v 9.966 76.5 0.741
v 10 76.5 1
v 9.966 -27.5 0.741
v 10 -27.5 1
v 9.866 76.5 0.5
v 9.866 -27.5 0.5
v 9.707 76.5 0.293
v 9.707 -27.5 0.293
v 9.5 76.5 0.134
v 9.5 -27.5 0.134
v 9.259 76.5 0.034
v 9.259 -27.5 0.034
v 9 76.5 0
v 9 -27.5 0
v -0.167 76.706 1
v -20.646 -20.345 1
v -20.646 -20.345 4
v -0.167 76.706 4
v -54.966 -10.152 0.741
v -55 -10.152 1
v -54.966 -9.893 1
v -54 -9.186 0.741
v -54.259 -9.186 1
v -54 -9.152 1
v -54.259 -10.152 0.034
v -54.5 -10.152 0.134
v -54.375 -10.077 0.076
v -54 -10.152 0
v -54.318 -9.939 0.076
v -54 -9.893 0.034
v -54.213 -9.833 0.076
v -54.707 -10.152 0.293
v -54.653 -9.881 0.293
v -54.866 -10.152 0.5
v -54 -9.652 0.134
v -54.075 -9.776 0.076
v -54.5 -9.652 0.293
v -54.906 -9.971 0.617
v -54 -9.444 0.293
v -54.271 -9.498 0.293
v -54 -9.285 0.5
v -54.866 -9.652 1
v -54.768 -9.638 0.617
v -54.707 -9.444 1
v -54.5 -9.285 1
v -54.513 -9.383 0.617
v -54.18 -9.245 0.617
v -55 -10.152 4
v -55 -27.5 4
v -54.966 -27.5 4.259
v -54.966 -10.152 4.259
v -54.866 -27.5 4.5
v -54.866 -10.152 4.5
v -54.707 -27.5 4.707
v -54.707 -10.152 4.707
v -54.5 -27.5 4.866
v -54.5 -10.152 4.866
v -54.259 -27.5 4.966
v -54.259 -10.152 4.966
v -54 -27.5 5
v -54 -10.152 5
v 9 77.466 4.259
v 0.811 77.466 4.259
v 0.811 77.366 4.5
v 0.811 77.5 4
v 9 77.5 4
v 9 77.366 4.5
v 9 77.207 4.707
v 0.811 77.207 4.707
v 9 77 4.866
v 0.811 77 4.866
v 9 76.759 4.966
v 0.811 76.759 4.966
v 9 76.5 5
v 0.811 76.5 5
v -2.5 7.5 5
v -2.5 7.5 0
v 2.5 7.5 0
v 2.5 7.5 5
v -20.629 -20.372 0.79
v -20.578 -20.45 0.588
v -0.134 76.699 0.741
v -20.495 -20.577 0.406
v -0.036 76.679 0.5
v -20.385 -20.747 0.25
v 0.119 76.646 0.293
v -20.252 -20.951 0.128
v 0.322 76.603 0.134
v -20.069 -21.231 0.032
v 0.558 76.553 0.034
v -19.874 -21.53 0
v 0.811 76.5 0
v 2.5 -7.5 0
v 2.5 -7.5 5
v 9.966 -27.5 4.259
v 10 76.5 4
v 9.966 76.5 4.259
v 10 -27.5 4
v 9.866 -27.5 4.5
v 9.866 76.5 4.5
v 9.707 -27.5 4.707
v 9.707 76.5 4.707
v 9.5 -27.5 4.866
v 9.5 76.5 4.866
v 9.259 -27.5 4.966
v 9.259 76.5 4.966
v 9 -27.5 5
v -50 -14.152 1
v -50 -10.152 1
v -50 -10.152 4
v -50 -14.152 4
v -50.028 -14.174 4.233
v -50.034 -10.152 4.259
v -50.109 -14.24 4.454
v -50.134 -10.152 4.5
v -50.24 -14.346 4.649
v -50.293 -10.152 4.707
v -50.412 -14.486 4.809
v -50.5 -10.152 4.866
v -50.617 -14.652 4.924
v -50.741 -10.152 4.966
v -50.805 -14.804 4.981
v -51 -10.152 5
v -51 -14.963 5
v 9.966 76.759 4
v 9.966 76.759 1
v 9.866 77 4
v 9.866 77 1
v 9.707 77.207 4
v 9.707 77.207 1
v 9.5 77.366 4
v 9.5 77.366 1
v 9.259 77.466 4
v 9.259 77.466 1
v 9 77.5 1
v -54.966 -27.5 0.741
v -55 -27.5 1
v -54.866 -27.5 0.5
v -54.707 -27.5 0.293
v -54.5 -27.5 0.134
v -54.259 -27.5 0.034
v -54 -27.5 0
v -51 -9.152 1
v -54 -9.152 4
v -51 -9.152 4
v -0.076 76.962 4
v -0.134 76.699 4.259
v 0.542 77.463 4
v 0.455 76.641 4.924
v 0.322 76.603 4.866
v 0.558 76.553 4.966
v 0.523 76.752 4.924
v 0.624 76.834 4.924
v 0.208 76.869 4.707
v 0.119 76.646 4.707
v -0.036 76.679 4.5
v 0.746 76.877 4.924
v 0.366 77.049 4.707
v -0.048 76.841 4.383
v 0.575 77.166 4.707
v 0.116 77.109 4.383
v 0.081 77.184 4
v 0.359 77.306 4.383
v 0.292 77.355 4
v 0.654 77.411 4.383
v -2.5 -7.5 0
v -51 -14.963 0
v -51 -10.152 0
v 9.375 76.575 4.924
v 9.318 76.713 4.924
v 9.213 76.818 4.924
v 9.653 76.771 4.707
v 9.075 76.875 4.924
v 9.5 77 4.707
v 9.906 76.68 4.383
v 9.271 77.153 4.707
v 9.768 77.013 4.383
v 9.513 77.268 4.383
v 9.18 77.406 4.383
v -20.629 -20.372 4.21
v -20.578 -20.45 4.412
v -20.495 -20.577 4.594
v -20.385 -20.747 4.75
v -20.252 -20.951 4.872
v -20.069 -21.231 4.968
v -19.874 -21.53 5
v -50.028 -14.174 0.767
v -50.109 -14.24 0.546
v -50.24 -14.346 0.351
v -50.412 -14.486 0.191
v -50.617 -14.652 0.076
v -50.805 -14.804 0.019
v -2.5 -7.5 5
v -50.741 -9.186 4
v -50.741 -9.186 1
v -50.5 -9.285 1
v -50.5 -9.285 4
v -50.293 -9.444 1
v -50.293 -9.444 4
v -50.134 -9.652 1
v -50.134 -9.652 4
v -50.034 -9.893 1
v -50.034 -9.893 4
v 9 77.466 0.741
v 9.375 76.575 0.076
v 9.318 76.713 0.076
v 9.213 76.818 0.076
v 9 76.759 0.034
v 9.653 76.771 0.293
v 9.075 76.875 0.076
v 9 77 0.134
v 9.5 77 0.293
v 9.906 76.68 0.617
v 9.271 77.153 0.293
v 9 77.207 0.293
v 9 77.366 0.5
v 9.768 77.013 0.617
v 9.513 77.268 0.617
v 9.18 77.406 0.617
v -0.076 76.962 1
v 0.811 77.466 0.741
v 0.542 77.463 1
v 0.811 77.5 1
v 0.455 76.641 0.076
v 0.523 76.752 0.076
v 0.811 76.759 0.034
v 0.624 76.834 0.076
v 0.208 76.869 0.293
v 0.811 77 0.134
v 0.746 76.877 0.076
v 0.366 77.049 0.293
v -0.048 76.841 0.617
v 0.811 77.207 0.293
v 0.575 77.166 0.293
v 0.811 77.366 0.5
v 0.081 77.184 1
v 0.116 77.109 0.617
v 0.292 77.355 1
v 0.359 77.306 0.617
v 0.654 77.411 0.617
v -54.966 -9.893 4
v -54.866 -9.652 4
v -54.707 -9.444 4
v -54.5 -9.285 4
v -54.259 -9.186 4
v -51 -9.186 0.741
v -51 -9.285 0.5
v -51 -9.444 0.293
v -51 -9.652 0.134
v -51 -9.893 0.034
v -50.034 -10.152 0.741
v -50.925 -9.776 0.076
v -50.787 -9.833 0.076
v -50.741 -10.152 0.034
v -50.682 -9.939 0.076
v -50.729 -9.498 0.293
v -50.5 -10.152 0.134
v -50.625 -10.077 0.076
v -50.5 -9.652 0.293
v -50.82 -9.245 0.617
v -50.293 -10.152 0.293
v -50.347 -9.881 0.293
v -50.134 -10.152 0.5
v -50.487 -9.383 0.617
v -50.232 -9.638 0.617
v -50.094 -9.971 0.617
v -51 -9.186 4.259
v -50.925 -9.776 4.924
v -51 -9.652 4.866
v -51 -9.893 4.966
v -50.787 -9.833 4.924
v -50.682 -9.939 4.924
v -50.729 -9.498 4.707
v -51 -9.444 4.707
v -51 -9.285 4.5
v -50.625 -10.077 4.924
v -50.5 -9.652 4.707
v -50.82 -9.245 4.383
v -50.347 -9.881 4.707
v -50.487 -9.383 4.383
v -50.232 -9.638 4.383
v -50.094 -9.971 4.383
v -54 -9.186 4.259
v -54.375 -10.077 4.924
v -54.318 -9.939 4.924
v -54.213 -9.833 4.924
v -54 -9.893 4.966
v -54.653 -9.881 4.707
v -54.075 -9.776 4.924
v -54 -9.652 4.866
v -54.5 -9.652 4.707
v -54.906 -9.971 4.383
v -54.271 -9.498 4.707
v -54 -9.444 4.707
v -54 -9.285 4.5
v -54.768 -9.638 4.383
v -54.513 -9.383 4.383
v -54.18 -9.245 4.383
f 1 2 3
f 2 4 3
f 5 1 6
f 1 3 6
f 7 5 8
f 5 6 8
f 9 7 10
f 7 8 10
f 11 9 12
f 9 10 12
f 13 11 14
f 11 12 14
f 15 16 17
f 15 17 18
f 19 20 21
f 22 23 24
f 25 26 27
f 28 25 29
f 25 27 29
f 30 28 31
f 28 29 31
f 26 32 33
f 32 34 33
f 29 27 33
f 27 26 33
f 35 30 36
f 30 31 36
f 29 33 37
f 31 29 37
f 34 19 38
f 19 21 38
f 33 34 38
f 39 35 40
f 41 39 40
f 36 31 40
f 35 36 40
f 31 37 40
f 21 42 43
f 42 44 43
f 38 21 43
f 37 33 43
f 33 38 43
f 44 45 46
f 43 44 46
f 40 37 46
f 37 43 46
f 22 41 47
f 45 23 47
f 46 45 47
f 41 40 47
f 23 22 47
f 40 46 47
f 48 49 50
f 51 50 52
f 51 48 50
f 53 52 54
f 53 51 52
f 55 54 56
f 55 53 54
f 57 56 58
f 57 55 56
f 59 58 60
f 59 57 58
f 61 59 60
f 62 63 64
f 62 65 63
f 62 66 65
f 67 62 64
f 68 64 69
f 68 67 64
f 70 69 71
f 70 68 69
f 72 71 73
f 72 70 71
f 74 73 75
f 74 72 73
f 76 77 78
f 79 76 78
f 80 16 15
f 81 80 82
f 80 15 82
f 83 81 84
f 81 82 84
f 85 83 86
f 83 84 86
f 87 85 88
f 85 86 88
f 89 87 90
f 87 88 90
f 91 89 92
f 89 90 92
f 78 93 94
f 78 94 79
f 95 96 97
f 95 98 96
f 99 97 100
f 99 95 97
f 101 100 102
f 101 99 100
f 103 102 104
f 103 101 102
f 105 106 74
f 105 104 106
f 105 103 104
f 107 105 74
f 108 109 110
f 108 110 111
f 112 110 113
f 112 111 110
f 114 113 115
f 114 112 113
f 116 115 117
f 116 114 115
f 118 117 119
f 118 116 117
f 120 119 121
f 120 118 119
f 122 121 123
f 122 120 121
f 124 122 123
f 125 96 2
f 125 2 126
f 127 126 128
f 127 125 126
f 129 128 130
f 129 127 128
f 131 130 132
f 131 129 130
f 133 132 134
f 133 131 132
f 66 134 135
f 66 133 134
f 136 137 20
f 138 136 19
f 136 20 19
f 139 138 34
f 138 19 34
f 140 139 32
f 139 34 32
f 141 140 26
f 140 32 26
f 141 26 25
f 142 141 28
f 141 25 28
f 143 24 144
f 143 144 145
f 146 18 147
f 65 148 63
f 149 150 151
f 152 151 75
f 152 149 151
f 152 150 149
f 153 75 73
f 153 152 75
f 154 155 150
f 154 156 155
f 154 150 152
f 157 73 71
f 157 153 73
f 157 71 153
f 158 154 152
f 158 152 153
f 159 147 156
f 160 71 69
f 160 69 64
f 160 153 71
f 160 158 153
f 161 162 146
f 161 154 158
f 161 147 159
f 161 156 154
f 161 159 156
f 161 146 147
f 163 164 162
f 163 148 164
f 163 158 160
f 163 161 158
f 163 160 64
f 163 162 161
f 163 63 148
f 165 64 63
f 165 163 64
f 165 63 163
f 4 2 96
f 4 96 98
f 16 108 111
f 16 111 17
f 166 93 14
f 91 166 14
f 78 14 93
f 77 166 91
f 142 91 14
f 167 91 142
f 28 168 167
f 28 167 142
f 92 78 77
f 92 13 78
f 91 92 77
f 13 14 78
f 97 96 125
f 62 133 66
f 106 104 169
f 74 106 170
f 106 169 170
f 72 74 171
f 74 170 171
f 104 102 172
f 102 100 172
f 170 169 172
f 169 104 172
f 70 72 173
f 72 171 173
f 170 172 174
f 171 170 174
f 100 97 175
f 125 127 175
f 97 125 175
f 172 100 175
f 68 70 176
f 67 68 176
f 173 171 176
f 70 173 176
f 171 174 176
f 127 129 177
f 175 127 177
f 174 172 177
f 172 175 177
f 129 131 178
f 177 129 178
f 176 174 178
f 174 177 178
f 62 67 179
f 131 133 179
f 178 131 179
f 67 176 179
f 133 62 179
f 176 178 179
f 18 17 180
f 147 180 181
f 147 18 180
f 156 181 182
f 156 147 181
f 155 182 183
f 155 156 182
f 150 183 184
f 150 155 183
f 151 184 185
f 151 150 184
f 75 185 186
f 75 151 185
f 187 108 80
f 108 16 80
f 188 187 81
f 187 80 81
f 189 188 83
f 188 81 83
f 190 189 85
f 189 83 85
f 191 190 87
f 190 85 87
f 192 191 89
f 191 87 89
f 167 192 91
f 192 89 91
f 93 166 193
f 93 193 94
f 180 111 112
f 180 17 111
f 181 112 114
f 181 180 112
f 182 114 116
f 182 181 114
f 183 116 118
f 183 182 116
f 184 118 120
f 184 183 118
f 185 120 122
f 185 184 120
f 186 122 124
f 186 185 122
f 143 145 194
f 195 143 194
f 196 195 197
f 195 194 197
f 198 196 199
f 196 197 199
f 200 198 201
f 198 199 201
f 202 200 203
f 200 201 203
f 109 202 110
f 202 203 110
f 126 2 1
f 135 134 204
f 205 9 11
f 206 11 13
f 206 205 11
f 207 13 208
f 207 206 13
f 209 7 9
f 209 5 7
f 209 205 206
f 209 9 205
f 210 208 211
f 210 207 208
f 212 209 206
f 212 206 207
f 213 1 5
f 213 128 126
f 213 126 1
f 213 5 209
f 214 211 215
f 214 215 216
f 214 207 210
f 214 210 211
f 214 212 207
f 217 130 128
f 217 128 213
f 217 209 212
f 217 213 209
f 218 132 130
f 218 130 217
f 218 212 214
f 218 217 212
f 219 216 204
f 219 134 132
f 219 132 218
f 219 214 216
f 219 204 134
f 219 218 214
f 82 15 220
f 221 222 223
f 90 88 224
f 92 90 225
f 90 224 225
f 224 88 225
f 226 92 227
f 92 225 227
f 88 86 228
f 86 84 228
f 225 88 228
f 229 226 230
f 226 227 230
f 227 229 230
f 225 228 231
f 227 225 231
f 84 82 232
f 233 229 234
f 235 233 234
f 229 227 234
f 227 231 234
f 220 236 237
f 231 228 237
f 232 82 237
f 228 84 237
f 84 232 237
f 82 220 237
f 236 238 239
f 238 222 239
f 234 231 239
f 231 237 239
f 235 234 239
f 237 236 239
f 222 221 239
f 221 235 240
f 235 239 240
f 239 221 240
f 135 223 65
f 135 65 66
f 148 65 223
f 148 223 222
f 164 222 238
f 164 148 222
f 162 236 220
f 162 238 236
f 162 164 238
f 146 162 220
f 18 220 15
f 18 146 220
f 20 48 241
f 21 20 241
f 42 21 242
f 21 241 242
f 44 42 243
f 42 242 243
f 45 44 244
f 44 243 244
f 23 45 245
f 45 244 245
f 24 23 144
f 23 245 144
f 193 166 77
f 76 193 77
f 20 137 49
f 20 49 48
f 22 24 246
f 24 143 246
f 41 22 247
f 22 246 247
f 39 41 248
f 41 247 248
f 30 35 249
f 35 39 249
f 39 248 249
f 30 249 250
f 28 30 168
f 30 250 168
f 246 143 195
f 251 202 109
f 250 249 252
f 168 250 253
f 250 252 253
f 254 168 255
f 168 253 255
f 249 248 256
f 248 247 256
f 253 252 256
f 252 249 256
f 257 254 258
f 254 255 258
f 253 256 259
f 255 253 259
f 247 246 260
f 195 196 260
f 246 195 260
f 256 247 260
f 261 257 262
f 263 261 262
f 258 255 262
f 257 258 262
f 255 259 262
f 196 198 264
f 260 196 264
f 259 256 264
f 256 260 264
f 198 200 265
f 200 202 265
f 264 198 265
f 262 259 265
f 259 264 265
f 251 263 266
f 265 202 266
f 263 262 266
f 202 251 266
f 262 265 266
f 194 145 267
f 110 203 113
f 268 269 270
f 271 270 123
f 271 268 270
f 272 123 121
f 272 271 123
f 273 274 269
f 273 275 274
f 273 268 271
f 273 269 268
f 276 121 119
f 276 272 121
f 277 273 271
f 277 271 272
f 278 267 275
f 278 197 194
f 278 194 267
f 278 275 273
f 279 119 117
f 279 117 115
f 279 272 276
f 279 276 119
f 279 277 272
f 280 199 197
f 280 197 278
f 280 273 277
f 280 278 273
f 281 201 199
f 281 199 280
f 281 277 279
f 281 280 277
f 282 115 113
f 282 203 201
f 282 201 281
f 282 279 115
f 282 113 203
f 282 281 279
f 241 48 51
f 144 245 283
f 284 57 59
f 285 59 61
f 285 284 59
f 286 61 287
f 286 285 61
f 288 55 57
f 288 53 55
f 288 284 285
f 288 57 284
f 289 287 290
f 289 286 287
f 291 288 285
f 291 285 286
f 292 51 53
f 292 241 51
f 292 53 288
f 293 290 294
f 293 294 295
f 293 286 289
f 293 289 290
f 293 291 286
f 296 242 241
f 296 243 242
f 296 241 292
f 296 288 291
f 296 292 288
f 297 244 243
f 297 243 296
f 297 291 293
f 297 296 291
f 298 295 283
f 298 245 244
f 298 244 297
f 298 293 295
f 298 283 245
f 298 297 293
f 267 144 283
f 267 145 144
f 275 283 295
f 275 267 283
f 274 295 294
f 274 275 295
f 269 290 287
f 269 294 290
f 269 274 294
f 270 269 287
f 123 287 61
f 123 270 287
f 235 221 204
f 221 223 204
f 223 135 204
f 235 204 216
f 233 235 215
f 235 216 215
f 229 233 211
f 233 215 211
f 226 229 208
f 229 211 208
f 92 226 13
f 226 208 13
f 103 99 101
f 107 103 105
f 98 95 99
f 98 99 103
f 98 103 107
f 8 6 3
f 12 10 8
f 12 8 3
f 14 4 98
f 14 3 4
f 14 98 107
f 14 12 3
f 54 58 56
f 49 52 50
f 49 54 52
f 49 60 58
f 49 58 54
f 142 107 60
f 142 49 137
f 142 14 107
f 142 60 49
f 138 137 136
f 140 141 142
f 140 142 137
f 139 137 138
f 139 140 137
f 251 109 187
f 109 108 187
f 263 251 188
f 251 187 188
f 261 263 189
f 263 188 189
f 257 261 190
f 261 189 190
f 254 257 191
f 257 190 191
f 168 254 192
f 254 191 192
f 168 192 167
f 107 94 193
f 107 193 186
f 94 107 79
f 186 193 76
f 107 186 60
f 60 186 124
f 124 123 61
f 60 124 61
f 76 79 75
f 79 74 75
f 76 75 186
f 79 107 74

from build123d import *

# Parameters (mm, degrees)
SKETCH_W      = 5
SKETCH_H      = 15
EXTRUDE_DEPTH = 5
FILLET_R      = 1


with BuildPart() as part:
    # Sketch → Extrude (new body)
    with BuildSketch(Plane.XY):
        Polygon((10, 77.5), (10, -27.5), (-55, -27.5), (-55, -9.151514), (-50, -9.151514), (-50, -14.151514), (-20.646372, -20.345426), (0, 77.5), align=None)
        Rectangle(SKETCH_W, SKETCH_H, mode=Mode.SUBTRACT)
    extrude(amount=EXTRUDE_DEPTH)

    # Fillet
    fillet_edges = [part.edges().sort_by_distance(p)[0] for p in [
        (10, 77.5, 2.5),
        (10, 25, 0),
        (10, 25, 5),
        (-55, -9.151514, 2.5),
        (-55, -18.325757, 0),
        (-55, -18.325757, 5),
        (-50, -9.151514, 2.5),
        (-52.5, -9.151514, 0),
        (-52.5, -9.151514, 5),
        (-50, -11.651514, 0),
        (-50, -11.651514, 5),
        (-35.323186, -17.24847, 0),
        (-35.323186, -17.24847, 5),
        (0, 77.5, 2.5),
        (-10.323186, 28.577287, 0),
        (-10.323186, 28.577287, 5),
        (5, 77.5, 0),
        (5, 77.5, 5),
    ]]
    fillet(fillet_edges, radius=FILLET_R)


solid = part.part
